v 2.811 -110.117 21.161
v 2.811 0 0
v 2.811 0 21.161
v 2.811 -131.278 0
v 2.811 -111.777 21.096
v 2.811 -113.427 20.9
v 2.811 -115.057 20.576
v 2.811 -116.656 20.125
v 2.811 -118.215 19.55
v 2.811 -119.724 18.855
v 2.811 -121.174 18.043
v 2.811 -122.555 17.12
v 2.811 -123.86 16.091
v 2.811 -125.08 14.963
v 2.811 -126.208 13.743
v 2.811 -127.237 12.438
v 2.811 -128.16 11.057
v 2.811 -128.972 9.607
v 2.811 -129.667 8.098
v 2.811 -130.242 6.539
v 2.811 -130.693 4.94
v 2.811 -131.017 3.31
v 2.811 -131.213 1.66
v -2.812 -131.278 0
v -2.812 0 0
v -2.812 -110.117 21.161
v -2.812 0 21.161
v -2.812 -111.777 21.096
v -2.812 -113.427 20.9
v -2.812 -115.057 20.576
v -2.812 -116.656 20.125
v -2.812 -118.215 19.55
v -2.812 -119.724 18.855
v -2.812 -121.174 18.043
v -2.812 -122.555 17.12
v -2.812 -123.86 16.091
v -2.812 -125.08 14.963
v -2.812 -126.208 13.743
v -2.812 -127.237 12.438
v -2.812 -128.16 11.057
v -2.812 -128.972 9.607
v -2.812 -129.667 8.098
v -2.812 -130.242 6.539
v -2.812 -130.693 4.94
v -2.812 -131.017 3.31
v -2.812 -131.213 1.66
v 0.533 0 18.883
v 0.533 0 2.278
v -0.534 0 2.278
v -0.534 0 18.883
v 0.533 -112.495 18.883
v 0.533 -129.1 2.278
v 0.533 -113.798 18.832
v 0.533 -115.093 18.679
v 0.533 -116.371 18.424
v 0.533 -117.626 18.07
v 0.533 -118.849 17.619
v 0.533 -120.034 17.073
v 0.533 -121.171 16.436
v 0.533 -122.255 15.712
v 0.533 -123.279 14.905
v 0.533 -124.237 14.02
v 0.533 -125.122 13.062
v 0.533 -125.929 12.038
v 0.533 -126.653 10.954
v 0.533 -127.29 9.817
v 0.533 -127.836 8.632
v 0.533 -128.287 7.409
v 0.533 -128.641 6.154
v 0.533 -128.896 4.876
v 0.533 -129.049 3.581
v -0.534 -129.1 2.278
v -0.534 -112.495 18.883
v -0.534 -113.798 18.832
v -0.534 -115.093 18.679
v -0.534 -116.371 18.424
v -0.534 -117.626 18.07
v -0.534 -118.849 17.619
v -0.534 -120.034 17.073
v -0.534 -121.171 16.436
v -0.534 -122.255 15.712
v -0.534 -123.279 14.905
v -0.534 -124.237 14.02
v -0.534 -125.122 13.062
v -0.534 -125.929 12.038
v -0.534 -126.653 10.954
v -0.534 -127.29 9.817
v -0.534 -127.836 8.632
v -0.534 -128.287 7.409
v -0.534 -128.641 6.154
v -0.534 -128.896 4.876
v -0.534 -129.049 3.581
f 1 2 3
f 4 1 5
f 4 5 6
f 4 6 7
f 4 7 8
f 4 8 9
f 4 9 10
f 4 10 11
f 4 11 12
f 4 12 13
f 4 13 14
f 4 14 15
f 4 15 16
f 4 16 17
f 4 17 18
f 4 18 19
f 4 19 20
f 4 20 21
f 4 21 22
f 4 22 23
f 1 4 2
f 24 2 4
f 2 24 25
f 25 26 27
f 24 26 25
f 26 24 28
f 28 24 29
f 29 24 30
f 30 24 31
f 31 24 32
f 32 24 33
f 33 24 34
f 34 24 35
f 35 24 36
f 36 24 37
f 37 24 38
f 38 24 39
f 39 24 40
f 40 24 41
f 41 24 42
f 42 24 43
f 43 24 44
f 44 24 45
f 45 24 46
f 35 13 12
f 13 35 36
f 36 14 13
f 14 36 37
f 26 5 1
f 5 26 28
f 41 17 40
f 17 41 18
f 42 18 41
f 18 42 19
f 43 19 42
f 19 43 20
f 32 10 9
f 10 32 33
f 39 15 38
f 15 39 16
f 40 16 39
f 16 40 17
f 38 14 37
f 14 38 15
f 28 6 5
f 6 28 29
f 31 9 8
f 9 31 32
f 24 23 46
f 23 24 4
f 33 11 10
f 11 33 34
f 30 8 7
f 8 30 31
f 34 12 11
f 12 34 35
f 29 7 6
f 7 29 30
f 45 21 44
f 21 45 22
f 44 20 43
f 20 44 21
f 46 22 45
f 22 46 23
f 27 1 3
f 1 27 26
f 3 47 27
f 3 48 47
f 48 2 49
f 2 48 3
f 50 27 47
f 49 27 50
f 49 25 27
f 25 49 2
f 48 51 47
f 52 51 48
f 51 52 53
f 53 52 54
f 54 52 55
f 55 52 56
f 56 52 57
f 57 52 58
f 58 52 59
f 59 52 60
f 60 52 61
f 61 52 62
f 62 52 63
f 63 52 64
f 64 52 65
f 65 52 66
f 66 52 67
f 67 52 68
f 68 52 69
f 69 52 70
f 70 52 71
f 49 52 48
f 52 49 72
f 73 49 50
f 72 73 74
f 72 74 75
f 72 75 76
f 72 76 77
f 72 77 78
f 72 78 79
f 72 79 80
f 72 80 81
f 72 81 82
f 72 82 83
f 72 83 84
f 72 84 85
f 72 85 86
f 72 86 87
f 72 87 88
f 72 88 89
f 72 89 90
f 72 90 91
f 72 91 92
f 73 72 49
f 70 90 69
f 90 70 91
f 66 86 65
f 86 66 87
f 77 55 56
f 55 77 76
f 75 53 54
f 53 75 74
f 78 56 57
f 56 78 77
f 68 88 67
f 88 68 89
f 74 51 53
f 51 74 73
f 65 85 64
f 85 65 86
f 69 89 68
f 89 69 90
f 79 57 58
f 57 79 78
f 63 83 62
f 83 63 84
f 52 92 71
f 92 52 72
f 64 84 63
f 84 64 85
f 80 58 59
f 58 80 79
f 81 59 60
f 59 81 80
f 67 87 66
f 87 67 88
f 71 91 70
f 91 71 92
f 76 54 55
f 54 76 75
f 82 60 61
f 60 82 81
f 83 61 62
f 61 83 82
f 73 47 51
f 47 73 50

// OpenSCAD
// parametric knife sheath
// original by Steve Pendergrast (vorpal)
// https://www.thingiverse.com/thing:125109
//
// remix v5.05 by BikeCyclist: Output rotated by 180 degrees to work around a suspected display bug in Thingiverse customizer - https://www.thingiverse.com/thing:4418138
// remix v5.04 by BikeCyclist: Default grip cutoff angle changed to something Thingiverse customizer can handle - https://www.thingiverse.com/thing:4418138
// remix v5.01 by BikeCyclist: Now supports negative grip cutoff angles 
// remix v4 by BikeCyclist: Bugfix for better walls with windows at high grip cutoff angles
// remix v3 by BikeCyclist: Bugfix (windows in thick walls) as suggested by Laurie, improved use of thingiverse customizer interface, better walls with windows at high grip cutoff angles
// remix v2 by BikeCyclist: Parametric wall thickness, shorter ridges, better symmetry
// remix v1 by BikeCyclist: Introducing holding ridge and oblique cut-off at grip
// https://www.thingiverse.com/thing:2856699

// length: the length of the blade from handle to tip
// maxwidth: the maximum width of the blade
// tipwidth:  the width near the tip, zero means it comes to a point
// thickness: maximum thickness of the blade
// has_windows:  0 = do not put in windows to show the blade and simplify cleaning
// has_ridges: 0 = do not add ridges to the sheath to hold the knife by friction
// grip_cutoff_angle:  the angle of the mouth of the sheet at the grip (off the vertical)
//

// Rule of thumb
// Make knife_length = length + 1 to 2mm
// Make knife_width = width + 1 to 2mm
// Make knife_thickness = length + .25mm

// all measurements are in mm

//CUSTOMIZER VARIABLES

//	Knife length, mm
knife_length = 127;	//	[25:350]

//	Knife Max Blade width, mm
knife_width =14.605 ;	//	[10:100]

//	Knife thickness, mm
knife_thickness = 1.067;

//	Wall thickness, mm
wall_thickness = 1.139 ;

// Show knife through windows?
has_windows = 0; // [0:No, 1:Yes]

// Number of windows per side
number_of_windows = 10; // [1:25]

// Sheath has ridges to hold the knife more securely?
has_ridges = 0; // [0:No, 1:Yes]

// Angle of the sheath at the grip (0 = vertical) [-75:75]
grip_cutoff_angle = 0;

//CUSTOMIZER VARIABLES END

$fn = 80*1;  // while debugging reduce this to 20 to save time

wall = 2*wall_thickness;
pad = 2*1;

translate ([0, 0, knife_width + 2 * wall + pad])
    rotate ([0, 180, 180])
        parasheath (length = knife_length, maxwidth = knife_width, thickness = knife_thickness, windows = has_windows);


module parasheath(length=200, maxwidth=25, thickness=2, windows=1) 
{
    difference() 
    {
        union () 
        {            
            sheathwid = maxwidth + pad + 2 * wall;
            extralen = (grip_cutoff_angle<0?sheathwid * tan (-grip_cutoff_angle):0);
            sheathlen = length + wall + pad + extralen;

            translate ([0, -extralen, 0])
            difference() 
            {
                // first make an oversized blade, oversized by 2 times the wall thickness
                
                
                blade(len = sheathlen, maxwid = sheathwid, thick = thickness + 2 * wall);

                translate([0, 0, wall]) 
                blade(len = length + 0.1 + pad + extralen, maxwid = maxwidth + pad, thick = thickness);

            }
            
            if (has_ridges)
            for (i = [-1, 1])
                translate([0, 0, wall + knife_width/2 + pad/2]) 
                    translate ([i * knife_thickness/2, 0, 0])
                        rotate ([-90, 0, 0])
                            scale ([1, 2, 1])
                                cylinder (d = knife_thickness / 2, h = length/8);
            
        }
        
        if (windows)
            intersection ()
            {
                {
                    straight_length = length - maxwidth * sin (grip_cutoff_angle);
                    for (j = [-1, 1])
                        for (i = [1 : number_of_windows])
                            translate([j * (wall + thickness), maxwidth * sin (grip_cutoff_angle) + straight_length/number_of_windows * i + straight_length/(4 * number_of_windows) * j, maxwidth/2 + wall + pad/2]) 
                                    cube([2 * (wall + thickness), straight_length/(2 * number_of_windows), maxwidth + pad], center = true);
                }
                
                translate([0, 0, wall]) 
                    blade(len = length + 0.1 + pad - wall, maxwid = maxwidth + pad, thick = 2 * thickness + 4 * wall);
            }

        rotate ([-grip_cutoff_angle, 0, 0])
            translate([0, -1000, 0])
                    cube([2000,2000,2000], center=true);
    }
    
    /* Ensure windows don't cut through the mouth edges of the sheath */
    if (windows)
        difference ()
        {
            maxwid = maxwidth + pad + 2 * wall;
            
            hull ()
            {
                rotate ([-grip_cutoff_angle, 0, 0])
                    translate([0, 0, 0.5 * maxwid / cos (grip_cutoff_angle)])
                        cube ([thickness + 2 * wall, 0.01, maxwid / cos (grip_cutoff_angle)], center = true);
                
                translate([0, wall / cos (grip_cutoff_angle), 0])
                    rotate ([-grip_cutoff_angle, 0, 0])
                        translate([0, 0, 0.5 * maxwid / cos (grip_cutoff_angle)])
                            cube ([thickness + 2 * wall, 0.01, maxwid / cos (grip_cutoff_angle)], center = true);
            }
            
            hull ()
            {
                translate([0, -wall / cos (grip_cutoff_angle), 0])
                    rotate ([-grip_cutoff_angle, 0, 0])
                        translate([0, 0, 0.5 * maxwid / cos (grip_cutoff_angle)])
                            cube ([thickness, 0.01, (maxwidth + pad) / cos (grip_cutoff_angle)], center = true);
                
                translate([0, 2 * wall / cos (grip_cutoff_angle), 0])
                    rotate ([-grip_cutoff_angle, 0, 0])
                        translate([0, 0, 0.5 * maxwid / cos (grip_cutoff_angle)])
                            cube ([thickness, 0.01, (maxwidth + pad) / cos (grip_cutoff_angle)], center = true);
            }
        }
}

module blade (len = 200, maxwid = 25, tipwid = 5, thick = 2) 
{
    translate ([-thick/2, 0, 0])
        union() {
            intersection() {
                    // first make a cube
                    cube([thick, len, maxwid]);
        
                    translate([0,len-maxwid,maxwid]) 
                        rotate([0,90,0]) 
                            cylinder(r=maxwid,h=thick*3,center=true);
            }

            cube([thick,len-maxwid,maxwid]);
        }
}
